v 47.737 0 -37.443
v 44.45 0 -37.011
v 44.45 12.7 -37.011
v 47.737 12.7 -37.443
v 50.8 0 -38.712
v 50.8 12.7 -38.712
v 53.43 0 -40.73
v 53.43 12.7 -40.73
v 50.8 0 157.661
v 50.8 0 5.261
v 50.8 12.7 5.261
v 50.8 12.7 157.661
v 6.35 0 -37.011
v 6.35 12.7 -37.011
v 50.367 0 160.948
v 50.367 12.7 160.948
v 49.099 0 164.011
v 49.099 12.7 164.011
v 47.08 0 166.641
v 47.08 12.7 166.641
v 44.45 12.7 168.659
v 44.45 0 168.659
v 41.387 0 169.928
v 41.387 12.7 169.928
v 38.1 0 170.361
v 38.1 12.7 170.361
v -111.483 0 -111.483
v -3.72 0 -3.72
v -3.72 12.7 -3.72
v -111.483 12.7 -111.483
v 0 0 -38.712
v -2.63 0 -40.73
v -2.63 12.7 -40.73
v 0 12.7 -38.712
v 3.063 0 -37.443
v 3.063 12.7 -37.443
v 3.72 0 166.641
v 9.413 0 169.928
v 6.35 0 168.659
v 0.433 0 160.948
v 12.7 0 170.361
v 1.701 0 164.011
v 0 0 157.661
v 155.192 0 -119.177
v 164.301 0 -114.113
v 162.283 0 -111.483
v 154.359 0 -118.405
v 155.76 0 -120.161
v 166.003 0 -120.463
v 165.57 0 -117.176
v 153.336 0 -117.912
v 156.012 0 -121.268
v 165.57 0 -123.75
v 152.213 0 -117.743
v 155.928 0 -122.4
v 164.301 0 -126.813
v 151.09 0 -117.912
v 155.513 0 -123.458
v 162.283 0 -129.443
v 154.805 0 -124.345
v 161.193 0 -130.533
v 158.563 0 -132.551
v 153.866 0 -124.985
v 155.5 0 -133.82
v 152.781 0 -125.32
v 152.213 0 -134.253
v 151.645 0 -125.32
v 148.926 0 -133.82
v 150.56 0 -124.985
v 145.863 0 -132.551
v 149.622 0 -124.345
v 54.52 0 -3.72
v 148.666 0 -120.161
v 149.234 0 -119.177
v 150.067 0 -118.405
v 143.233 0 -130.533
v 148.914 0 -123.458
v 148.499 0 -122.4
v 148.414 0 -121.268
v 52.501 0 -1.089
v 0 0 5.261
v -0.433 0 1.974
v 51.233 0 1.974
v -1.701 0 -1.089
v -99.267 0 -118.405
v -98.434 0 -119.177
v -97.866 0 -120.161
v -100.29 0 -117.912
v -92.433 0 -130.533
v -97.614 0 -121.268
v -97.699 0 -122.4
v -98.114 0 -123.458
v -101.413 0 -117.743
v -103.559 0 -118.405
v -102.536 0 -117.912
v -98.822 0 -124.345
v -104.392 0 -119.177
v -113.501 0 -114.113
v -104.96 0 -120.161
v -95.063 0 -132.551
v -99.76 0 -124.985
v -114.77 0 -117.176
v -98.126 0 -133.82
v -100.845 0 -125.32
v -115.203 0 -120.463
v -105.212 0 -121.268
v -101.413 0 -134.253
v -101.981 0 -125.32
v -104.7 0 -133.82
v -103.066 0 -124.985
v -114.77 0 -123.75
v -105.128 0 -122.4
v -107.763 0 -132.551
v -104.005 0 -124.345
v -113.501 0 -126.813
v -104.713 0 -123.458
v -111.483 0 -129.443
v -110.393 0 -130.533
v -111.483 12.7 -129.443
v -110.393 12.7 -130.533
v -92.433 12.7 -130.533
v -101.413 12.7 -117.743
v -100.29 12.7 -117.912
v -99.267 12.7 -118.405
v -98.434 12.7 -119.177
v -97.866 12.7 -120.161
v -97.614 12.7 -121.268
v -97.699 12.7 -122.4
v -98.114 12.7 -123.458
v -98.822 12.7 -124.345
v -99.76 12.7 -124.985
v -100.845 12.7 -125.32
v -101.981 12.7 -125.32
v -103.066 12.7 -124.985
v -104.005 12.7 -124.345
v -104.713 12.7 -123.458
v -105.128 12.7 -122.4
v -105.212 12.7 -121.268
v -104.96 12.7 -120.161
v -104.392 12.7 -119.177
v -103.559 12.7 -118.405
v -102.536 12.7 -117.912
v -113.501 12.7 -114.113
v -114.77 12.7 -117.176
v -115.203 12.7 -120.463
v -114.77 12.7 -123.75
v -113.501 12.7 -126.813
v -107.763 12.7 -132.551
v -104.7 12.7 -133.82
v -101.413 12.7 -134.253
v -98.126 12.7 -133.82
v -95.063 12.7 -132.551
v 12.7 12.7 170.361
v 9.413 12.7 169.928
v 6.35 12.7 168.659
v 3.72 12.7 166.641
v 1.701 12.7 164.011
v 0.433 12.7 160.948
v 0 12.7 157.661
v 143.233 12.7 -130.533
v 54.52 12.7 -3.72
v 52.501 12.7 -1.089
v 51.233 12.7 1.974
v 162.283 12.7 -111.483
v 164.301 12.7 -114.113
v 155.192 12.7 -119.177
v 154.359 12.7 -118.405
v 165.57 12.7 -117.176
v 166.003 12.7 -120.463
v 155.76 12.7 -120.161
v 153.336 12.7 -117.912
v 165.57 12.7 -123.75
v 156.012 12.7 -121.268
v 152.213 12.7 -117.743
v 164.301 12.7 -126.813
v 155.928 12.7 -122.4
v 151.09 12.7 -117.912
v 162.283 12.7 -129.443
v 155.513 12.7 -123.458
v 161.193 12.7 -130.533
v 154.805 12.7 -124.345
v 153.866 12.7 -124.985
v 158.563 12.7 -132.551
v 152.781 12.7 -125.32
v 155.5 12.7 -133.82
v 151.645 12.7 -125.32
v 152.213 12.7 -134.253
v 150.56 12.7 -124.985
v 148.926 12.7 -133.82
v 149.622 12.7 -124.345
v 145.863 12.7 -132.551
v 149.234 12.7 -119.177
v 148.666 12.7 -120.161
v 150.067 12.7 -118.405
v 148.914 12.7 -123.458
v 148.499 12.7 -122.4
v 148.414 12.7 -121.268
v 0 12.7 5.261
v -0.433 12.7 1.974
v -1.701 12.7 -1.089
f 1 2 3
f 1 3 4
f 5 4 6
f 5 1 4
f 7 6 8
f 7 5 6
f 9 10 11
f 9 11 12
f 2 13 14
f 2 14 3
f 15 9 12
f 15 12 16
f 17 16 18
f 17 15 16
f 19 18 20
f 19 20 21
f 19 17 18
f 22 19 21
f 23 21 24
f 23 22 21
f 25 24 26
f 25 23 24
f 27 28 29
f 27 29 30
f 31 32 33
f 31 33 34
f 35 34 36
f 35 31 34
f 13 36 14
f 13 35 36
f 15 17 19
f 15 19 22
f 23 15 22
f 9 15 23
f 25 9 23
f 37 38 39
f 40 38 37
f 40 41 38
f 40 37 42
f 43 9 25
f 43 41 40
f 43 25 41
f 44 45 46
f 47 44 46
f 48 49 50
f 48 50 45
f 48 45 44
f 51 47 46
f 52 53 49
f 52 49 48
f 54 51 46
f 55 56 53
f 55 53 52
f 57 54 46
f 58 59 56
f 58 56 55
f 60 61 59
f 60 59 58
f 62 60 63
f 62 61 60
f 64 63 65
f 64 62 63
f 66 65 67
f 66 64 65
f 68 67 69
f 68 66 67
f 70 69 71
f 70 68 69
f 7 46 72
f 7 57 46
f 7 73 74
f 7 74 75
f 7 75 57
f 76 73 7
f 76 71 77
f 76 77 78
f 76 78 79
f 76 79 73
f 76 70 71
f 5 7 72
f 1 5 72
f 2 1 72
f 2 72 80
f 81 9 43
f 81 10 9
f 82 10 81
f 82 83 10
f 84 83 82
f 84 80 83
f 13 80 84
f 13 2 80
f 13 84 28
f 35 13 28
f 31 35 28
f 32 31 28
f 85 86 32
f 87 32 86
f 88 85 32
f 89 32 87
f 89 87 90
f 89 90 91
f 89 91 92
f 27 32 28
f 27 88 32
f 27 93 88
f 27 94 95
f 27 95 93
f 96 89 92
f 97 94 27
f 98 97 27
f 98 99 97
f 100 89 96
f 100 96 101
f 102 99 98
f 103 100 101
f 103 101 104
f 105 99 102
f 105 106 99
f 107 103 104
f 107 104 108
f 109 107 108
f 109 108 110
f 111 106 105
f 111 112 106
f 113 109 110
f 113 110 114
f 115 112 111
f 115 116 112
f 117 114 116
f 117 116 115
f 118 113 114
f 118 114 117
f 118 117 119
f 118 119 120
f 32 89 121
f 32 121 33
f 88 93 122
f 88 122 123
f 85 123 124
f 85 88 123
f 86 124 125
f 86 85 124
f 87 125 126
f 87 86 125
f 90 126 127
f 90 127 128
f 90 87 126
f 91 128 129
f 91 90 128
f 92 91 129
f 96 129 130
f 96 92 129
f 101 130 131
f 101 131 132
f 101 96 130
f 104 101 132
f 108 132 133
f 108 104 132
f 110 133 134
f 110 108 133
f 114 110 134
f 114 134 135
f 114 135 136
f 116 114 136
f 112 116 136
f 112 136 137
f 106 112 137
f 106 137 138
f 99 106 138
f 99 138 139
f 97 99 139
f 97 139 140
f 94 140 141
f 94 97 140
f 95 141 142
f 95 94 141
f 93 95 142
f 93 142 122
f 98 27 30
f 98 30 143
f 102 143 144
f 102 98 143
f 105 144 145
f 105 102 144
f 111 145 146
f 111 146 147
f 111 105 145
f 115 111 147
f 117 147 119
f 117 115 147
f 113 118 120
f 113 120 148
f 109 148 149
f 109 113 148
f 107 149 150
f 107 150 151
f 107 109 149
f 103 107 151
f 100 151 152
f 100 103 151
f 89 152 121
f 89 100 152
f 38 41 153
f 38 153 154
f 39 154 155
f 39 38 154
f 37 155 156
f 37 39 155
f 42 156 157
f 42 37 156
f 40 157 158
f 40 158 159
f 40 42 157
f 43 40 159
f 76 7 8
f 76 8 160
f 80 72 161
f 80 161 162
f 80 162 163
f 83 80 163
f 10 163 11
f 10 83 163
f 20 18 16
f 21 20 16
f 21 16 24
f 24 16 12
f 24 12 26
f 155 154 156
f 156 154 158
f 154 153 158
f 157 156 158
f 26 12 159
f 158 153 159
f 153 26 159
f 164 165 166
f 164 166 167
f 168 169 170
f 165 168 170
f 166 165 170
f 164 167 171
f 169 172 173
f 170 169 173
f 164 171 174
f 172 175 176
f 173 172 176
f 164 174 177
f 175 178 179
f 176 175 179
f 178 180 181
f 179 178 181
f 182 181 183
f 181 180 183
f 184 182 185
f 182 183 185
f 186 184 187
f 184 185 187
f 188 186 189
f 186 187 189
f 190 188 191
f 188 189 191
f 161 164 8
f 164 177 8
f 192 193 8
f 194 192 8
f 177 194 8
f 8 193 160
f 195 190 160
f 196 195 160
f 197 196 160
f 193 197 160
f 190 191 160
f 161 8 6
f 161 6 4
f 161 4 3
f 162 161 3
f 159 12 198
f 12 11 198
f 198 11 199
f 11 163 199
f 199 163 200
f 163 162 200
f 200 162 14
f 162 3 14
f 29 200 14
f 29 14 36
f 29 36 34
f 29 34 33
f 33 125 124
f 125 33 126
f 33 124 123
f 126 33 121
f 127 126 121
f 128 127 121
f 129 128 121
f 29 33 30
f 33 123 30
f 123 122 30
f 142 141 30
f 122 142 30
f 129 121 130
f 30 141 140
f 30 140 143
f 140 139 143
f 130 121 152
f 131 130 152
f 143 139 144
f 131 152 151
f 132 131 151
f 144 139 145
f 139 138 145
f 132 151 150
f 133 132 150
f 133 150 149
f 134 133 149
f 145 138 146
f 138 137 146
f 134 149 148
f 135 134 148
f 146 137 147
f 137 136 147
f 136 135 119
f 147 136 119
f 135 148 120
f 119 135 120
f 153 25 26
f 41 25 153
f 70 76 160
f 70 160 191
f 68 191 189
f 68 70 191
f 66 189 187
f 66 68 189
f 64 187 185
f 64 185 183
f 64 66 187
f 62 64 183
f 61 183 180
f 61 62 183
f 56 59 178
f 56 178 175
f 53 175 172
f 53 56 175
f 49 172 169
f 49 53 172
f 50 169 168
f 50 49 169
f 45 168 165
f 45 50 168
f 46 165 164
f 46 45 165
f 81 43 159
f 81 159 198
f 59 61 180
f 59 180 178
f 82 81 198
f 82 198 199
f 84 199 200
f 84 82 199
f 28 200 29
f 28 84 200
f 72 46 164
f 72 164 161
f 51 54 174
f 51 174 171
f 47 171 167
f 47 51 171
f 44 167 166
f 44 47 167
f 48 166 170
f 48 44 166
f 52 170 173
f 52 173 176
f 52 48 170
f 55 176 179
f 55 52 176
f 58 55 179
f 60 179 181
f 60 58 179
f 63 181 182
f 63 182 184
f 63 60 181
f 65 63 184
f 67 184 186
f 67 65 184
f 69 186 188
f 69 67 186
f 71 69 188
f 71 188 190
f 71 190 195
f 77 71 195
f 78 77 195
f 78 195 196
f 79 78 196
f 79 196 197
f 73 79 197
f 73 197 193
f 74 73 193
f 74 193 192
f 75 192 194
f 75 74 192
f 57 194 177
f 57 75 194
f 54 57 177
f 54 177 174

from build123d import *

# Parameters (mm, degrees)
SKETCH1_R           = 3.81
BOSS_EXTRUDE1_DEPTH = 12.7


with BuildPart() as part:
    # Sketch1 → Boss-Extrude1 (new body)
    with BuildSketch(Plane(origin=(0, 0, 0), x_dir=(1, 0, 0), z_dir=(0, 1, 0))):
        with BuildLine():
            Line((-3.719743879, 3.719743879), (-111.482817332, 111.482817332))
            ThreePointArc((-111.482817332, 111.482817332), (-115.202561211, 120.463073453), (-111.482817332, 129.443329574))
            Line((-111.482817332, 129.443329574), (-110.393329574, 130.532817332))
            ThreePointArc((-110.393329574, 130.532817332), (-101.413073453, 134.252561211), (-92.432817332, 130.532817332))
            Line((-92.432817332, 130.532817332), (-2.630256121, 40.730256121))
            ThreePointArc((-2.630256121, 40.730256121), (1.489920409, 37.977242179), (6.35, 37.010512242))
            Line((6.35, 37.010512242), (44.45, 37.010512242))
            ThreePointArc((44.45, 37.010512242), (49.310079591, 37.977242179), (53.430256121, 40.730256121))
            Line((53.430256121, 40.730256121), (143.232817332, 130.532817332))
            ThreePointArc((143.232817332, 130.532817332), (152.213073453, 134.252561211), (161.193329574, 130.532817332))
            Line((161.193329574, 130.532817332), (162.282817332, 129.443329574))
            ThreePointArc((162.282817332, 129.443329574), (166.002561211, 120.463073453), (162.282817332, 111.482817332))
            Line((162.282817332, 111.482817332), (54.519743879, 3.719743879))
            ThreePointArc((54.519743879, 3.719743879), (51.766729937, -0.400432651), (50.8, -5.260512242))
            Line((50.8, -5.260512242), (50.8, -157.660512242))
            ThreePointArc((50.8, -157.660512242), (47.080256121, -166.640768363), (38.1, -170.360512242))
            Line((38.1, -170.360512242), (12.7, -170.360512242))
            ThreePointArc((12.7, -170.360512242), (3.719743879, -166.640768363), (0, -157.660512242))
            Line((0, -157.660512242), (0, -5.260512242))
            ThreePointArc((0, -5.260512242), (-0.966729937, -0.400432651), (-3.719743879, 3.719743879))
        make_face()
        with Locations(Location((152.213073453, 121.552561211, 0), (0, 0, 270))):
            Circle(SKETCH1_R, mode=Mode.SUBTRACT)
        with Locations(Location((-101.413073453, 121.552561211, 0), (0, 0, 270))):
            Circle(SKETCH1_R, mode=Mode.SUBTRACT)
    extrude(amount=BOSS_EXTRUDE1_DEPTH)


solid = part.part
